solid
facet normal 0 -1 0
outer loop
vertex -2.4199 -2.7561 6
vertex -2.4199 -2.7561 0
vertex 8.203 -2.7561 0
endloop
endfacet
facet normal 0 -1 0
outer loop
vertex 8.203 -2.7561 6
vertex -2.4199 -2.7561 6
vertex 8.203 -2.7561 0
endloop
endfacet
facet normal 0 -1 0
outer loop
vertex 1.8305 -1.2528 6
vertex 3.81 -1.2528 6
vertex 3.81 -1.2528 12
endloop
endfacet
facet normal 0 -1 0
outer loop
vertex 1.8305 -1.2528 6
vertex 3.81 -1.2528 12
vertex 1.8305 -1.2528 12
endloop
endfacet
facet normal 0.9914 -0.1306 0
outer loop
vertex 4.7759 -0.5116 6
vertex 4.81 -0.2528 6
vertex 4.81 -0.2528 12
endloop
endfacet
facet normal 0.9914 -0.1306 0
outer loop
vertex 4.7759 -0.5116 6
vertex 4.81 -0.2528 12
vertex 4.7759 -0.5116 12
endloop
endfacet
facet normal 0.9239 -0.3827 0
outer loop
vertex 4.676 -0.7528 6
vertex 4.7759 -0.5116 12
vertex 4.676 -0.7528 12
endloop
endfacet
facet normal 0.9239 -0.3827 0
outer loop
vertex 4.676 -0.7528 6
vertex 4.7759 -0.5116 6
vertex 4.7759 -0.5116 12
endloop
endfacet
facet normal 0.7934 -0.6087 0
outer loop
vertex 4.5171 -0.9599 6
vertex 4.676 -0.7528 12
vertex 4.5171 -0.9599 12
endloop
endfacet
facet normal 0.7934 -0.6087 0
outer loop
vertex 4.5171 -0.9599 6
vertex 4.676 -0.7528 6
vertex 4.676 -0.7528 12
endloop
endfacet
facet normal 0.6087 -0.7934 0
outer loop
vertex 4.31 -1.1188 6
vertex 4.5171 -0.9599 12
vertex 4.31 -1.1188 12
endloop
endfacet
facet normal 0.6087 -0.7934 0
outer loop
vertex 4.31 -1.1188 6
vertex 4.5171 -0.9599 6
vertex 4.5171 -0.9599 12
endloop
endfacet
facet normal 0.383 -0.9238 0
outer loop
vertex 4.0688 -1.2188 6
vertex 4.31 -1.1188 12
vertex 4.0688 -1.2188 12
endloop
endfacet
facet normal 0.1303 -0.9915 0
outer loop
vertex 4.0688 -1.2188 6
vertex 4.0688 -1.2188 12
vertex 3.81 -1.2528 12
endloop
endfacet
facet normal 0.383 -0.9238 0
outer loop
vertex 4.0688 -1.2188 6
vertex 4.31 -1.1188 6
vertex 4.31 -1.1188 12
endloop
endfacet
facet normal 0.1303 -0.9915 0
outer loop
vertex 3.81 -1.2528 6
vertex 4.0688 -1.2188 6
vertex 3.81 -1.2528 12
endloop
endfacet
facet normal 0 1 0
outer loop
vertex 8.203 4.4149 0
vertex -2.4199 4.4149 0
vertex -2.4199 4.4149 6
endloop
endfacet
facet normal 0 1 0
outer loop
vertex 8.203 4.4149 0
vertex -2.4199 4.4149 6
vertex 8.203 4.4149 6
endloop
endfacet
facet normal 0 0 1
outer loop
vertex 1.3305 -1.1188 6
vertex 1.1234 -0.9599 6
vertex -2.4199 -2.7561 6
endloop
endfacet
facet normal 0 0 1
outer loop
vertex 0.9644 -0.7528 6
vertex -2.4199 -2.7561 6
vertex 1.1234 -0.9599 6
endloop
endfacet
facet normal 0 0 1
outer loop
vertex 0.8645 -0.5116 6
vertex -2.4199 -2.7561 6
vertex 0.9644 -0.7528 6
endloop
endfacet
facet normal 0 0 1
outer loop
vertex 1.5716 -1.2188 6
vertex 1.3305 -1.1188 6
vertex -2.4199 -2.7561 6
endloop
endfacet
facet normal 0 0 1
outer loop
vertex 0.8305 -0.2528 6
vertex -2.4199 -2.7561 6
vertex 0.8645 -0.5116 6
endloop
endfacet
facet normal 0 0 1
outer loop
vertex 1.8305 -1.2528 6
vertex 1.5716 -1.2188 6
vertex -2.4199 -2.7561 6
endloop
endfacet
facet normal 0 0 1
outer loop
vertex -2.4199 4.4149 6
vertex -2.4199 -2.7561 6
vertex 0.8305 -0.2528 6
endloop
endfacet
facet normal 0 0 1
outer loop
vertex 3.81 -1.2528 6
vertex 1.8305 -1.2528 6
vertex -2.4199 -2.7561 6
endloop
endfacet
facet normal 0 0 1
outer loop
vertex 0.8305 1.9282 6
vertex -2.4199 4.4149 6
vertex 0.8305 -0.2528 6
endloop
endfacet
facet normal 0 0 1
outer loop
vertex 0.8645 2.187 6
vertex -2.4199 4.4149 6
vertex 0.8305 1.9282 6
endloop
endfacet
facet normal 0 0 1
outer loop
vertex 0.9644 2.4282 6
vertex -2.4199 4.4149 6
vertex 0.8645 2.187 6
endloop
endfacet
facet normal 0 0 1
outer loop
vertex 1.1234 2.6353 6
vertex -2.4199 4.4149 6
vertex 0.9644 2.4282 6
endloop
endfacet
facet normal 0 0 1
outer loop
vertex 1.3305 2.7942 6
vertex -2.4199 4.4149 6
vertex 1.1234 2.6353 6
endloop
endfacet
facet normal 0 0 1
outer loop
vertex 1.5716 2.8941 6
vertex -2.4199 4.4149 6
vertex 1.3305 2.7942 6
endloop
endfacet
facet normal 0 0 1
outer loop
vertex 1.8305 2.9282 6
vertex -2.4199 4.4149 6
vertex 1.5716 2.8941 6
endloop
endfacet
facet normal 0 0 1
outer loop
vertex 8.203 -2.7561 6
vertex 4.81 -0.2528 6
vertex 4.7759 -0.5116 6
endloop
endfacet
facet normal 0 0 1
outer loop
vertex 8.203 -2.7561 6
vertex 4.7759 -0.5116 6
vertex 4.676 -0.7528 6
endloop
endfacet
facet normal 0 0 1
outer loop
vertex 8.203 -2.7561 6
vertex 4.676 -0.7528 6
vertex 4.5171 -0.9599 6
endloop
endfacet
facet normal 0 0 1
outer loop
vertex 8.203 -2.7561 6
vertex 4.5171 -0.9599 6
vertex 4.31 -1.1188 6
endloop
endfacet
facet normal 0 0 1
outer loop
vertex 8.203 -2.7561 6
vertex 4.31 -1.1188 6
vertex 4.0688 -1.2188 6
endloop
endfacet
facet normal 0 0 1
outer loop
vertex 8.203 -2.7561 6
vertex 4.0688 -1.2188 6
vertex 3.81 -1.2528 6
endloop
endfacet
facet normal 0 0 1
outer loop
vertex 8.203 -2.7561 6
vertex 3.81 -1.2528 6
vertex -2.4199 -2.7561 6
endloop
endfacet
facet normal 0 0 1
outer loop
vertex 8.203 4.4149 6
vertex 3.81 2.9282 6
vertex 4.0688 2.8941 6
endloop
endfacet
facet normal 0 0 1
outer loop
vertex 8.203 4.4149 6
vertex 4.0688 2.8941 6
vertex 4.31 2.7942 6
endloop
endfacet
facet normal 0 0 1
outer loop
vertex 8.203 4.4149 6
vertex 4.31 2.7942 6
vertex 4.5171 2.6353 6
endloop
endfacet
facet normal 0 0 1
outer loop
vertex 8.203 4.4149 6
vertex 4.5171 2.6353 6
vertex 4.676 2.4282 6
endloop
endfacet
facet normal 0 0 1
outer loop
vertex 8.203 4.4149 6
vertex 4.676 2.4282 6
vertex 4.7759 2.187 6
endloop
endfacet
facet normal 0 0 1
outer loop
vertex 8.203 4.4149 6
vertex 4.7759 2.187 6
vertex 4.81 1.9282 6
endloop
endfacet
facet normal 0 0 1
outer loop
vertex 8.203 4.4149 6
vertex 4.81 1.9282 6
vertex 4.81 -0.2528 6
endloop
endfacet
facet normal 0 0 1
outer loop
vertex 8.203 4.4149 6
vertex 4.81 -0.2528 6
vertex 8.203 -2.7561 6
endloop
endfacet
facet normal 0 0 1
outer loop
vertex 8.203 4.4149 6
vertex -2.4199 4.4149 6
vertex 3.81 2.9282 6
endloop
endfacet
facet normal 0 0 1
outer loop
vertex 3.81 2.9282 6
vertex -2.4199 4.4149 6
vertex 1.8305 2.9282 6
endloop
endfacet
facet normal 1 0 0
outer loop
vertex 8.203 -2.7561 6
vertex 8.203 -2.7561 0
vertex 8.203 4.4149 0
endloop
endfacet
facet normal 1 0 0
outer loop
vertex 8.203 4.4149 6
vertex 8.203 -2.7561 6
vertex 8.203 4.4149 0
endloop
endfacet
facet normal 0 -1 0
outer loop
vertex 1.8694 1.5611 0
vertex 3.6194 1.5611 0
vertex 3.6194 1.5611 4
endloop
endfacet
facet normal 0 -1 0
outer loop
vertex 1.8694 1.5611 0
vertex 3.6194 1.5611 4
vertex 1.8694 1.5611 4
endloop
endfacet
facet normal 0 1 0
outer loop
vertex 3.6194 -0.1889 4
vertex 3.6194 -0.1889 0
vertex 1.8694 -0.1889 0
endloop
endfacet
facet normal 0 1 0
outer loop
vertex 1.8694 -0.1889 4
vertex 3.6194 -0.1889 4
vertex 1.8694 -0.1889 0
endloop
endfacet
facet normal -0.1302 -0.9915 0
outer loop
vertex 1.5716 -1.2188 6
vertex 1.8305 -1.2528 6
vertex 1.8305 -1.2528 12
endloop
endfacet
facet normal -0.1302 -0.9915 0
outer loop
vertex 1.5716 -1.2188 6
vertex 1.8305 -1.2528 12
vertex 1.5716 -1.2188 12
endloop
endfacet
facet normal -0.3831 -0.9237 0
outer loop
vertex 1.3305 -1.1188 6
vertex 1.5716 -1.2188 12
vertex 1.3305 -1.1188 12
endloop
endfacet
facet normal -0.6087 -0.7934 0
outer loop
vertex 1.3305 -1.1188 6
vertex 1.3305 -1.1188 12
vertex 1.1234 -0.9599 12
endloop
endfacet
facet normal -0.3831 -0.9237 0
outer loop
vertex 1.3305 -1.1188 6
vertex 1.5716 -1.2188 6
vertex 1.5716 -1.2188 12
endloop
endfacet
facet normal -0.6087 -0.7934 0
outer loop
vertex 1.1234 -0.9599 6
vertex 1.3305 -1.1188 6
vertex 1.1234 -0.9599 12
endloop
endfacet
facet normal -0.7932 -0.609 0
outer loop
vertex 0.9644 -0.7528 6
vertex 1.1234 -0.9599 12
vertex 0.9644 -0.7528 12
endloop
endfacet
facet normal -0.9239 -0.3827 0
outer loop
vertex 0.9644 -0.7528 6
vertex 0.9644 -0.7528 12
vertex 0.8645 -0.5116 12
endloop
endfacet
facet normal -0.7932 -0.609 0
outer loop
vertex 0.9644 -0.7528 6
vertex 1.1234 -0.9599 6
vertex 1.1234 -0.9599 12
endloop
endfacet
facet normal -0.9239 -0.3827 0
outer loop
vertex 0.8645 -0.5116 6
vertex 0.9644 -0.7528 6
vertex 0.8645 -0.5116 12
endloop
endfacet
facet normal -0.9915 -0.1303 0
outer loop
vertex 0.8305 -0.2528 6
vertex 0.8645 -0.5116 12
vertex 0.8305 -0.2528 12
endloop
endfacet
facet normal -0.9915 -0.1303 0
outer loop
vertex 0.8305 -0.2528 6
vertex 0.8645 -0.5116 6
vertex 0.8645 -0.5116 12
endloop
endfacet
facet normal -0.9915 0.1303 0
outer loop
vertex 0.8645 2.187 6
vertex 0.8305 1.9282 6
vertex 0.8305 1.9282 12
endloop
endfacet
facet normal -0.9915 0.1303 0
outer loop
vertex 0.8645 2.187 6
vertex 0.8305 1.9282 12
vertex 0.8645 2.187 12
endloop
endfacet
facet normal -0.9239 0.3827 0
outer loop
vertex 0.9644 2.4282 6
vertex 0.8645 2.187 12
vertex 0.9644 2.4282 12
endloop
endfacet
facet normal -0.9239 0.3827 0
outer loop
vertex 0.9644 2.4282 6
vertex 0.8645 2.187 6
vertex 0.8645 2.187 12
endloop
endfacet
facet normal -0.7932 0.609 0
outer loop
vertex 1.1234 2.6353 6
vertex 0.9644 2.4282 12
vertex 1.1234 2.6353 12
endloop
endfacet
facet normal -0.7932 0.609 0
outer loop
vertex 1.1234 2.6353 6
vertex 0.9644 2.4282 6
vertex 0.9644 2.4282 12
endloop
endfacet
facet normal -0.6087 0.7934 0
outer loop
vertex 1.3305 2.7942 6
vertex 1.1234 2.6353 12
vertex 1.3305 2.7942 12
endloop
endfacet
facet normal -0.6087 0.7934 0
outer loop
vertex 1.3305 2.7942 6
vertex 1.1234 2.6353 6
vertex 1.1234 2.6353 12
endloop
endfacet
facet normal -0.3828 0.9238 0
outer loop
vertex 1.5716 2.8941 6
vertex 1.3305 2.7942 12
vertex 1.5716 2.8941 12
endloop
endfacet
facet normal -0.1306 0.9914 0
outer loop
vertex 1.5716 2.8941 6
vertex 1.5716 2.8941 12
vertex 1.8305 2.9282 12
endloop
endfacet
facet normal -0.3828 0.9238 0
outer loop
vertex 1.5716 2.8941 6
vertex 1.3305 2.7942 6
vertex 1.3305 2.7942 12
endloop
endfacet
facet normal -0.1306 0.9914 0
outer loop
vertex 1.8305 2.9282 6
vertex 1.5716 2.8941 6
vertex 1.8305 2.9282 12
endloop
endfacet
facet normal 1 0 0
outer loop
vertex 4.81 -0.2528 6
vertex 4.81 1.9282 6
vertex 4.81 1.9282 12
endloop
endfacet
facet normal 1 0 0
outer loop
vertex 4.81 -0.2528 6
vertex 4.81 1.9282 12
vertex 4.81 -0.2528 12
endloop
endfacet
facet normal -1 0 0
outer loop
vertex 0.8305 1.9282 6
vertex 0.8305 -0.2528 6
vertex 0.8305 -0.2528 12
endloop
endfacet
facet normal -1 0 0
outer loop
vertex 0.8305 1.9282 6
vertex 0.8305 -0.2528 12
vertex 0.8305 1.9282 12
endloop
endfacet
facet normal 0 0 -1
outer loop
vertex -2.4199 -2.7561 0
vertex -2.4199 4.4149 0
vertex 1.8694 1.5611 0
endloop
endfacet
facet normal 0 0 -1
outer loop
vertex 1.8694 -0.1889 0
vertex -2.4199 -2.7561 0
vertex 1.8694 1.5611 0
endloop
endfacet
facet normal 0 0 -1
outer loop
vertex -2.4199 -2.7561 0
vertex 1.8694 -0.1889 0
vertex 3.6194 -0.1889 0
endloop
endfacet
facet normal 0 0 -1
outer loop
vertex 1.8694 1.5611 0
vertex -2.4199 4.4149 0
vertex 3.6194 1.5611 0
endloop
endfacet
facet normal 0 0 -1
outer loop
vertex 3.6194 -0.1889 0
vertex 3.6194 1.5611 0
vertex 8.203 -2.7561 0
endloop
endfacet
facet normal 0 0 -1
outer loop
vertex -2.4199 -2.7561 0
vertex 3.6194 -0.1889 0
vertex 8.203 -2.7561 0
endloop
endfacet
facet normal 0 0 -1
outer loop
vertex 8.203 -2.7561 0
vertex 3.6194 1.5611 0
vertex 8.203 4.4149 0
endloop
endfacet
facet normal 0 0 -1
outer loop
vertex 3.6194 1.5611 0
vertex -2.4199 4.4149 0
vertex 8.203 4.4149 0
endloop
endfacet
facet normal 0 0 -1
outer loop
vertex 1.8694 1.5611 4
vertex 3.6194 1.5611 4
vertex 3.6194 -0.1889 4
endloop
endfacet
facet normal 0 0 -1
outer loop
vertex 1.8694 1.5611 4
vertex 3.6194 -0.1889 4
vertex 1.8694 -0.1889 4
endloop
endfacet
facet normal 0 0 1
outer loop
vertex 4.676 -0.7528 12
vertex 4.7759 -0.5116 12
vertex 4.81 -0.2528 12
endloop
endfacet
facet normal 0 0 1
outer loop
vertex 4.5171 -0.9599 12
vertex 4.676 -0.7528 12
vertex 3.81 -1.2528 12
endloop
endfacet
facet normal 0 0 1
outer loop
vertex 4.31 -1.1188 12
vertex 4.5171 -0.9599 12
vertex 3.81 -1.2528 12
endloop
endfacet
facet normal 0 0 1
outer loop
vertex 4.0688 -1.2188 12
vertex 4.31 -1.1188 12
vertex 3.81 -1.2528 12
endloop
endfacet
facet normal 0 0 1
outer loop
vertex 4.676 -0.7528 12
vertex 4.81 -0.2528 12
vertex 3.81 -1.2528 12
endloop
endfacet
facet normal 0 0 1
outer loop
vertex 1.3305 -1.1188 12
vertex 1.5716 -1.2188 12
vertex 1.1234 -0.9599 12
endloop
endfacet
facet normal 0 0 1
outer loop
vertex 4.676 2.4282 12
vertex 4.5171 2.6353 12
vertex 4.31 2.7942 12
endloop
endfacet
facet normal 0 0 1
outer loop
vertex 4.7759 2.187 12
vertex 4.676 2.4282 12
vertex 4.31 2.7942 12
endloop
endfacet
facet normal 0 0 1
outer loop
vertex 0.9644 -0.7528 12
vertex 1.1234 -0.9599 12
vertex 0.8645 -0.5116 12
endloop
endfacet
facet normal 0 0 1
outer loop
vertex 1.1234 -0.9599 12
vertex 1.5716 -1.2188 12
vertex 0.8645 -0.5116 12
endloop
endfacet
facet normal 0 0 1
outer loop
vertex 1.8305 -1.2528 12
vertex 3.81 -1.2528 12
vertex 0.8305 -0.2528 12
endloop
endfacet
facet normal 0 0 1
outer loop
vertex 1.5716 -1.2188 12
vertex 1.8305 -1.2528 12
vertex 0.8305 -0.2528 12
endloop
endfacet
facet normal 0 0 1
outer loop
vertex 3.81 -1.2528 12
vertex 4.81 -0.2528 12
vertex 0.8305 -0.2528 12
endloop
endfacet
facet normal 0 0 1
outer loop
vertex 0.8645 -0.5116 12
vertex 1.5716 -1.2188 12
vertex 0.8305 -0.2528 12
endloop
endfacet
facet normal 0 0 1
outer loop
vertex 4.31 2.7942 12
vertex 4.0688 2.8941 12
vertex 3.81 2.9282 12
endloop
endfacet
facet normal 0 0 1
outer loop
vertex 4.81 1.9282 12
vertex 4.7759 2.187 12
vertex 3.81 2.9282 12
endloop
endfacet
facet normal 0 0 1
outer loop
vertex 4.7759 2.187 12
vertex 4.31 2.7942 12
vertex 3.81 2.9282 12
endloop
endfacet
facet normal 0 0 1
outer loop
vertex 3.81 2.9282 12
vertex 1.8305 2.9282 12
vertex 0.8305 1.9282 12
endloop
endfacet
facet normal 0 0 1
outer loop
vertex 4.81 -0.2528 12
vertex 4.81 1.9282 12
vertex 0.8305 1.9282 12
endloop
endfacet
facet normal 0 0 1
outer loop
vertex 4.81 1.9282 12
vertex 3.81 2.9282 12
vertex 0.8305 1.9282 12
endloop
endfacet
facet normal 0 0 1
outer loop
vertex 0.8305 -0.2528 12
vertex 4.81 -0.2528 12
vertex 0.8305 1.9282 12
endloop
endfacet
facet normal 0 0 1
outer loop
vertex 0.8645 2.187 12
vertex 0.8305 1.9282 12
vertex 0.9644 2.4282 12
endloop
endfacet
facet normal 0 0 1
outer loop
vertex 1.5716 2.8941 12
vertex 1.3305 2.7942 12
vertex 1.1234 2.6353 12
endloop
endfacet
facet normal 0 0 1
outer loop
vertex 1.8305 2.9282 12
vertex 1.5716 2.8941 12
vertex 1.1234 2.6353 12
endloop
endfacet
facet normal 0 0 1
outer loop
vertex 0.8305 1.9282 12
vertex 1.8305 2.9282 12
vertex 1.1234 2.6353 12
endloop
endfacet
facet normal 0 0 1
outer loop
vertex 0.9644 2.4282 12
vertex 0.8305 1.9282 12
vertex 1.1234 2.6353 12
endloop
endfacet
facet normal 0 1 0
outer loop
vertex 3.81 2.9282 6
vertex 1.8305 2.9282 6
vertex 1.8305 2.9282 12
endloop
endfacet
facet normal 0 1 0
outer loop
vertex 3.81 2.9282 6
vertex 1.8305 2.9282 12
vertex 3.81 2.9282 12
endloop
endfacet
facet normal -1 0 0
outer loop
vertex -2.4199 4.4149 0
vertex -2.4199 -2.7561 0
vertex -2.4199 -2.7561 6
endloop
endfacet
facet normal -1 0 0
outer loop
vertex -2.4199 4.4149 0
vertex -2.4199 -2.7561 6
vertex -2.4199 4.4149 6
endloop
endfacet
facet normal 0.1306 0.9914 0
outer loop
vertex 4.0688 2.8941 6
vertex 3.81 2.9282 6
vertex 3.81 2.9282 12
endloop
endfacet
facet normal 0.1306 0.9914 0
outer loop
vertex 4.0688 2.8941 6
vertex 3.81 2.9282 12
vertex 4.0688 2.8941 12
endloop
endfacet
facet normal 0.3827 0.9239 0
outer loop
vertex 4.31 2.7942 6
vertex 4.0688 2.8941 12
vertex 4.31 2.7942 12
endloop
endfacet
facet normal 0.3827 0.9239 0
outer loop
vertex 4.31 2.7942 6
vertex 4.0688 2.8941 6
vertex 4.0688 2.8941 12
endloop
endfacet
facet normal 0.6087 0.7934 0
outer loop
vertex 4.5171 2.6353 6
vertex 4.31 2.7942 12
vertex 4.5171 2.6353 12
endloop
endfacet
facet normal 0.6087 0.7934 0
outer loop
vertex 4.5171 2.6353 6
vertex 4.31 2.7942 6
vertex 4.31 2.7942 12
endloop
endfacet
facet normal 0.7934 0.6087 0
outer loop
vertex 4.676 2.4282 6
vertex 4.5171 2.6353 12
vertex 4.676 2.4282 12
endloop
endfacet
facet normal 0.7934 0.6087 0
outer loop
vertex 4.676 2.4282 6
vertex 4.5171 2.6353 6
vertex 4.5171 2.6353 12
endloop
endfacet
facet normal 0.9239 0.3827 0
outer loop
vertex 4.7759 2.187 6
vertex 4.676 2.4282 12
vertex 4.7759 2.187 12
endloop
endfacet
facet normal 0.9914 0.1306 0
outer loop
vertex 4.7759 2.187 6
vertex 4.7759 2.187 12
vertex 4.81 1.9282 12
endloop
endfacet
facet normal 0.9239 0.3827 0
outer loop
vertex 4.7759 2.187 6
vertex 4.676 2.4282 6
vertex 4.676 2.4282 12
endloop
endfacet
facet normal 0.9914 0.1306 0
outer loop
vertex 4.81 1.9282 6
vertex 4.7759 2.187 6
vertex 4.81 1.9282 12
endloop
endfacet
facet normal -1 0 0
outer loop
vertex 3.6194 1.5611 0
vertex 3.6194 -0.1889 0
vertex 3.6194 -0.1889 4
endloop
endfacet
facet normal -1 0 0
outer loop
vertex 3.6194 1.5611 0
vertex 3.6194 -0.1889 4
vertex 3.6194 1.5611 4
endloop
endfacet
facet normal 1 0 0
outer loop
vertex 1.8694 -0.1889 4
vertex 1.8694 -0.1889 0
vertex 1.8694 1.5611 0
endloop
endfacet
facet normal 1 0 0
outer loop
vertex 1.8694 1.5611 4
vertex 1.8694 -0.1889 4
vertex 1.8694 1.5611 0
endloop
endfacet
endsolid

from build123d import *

# Parameters (mm, degrees)
SKETCH_1_W          = 10.622879294
SKETCH_1_H          = 7.171059062
EXTRUDE_1_DEPTH     = 6
EXTRUDE_2_DEPTH     = 6
SKETCH_3_W          = 1.75
SKETCH_3_H          = 1.75
CUT_EXTRUDE_1_DEPTH = 4


with BuildPart() as part:
    # 草图1 → 凸台-拉伸1 (new body)
    with BuildSketch(Plane.XY):
        with Locations((2.891532243, 0.829398912)):
            Rectangle(SKETCH_1_W, SKETCH_1_H)
    extrude(amount=EXTRUDE_1_DEPTH)

    # 草图2 → 凸台-拉伸2 (add)
    with BuildSketch(Plane.XY.offset(6)):
        with BuildLine():
            Line((1.830465057, 2.928210333), (3.810000549, 2.928210333))
            ThreePointArc((3.810000549, 2.928210333), (4.51710733, 2.635317114), (4.810000549, 1.928210333))
            Line((4.810000549, 1.928210333), (4.810000549, -0.252824237))
            ThreePointArc((4.810000549, -0.252824237), (4.51710733, -0.959931018), (3.810000549, -1.252824237))
            Line((3.810000549, -1.252824237), (1.830465057, -1.252824237))
            ThreePointArc((1.830465057, -1.252824237), (1.123358276, -0.959931018), (0.830465057, -0.252824237))
            Line((0.830465057, -0.252824237), (0.830465057, 1.928210333))
            ThreePointArc((0.830465057, 1.928210333), (1.123358276, 2.635317114), (1.830465057, 2.928210333))
        make_face()
    extrude(amount=EXTRUDE_2_DEPTH)

    # 草图3 → 切除-拉伸1 (cut)
    with BuildSketch(Plane(origin=(0, 0, 0), x_dir=(-1, 0, 0), z_dir=(0, 0, -1))):
        with Locations((-2.744430707, 0.686146252)):
            Rectangle(SKETCH_3_W, SKETCH_3_H)
    extrude(amount=-CUT_EXTRUDE_1_DEPTH, mode=Mode.SUBTRACT)


solid = part.part
